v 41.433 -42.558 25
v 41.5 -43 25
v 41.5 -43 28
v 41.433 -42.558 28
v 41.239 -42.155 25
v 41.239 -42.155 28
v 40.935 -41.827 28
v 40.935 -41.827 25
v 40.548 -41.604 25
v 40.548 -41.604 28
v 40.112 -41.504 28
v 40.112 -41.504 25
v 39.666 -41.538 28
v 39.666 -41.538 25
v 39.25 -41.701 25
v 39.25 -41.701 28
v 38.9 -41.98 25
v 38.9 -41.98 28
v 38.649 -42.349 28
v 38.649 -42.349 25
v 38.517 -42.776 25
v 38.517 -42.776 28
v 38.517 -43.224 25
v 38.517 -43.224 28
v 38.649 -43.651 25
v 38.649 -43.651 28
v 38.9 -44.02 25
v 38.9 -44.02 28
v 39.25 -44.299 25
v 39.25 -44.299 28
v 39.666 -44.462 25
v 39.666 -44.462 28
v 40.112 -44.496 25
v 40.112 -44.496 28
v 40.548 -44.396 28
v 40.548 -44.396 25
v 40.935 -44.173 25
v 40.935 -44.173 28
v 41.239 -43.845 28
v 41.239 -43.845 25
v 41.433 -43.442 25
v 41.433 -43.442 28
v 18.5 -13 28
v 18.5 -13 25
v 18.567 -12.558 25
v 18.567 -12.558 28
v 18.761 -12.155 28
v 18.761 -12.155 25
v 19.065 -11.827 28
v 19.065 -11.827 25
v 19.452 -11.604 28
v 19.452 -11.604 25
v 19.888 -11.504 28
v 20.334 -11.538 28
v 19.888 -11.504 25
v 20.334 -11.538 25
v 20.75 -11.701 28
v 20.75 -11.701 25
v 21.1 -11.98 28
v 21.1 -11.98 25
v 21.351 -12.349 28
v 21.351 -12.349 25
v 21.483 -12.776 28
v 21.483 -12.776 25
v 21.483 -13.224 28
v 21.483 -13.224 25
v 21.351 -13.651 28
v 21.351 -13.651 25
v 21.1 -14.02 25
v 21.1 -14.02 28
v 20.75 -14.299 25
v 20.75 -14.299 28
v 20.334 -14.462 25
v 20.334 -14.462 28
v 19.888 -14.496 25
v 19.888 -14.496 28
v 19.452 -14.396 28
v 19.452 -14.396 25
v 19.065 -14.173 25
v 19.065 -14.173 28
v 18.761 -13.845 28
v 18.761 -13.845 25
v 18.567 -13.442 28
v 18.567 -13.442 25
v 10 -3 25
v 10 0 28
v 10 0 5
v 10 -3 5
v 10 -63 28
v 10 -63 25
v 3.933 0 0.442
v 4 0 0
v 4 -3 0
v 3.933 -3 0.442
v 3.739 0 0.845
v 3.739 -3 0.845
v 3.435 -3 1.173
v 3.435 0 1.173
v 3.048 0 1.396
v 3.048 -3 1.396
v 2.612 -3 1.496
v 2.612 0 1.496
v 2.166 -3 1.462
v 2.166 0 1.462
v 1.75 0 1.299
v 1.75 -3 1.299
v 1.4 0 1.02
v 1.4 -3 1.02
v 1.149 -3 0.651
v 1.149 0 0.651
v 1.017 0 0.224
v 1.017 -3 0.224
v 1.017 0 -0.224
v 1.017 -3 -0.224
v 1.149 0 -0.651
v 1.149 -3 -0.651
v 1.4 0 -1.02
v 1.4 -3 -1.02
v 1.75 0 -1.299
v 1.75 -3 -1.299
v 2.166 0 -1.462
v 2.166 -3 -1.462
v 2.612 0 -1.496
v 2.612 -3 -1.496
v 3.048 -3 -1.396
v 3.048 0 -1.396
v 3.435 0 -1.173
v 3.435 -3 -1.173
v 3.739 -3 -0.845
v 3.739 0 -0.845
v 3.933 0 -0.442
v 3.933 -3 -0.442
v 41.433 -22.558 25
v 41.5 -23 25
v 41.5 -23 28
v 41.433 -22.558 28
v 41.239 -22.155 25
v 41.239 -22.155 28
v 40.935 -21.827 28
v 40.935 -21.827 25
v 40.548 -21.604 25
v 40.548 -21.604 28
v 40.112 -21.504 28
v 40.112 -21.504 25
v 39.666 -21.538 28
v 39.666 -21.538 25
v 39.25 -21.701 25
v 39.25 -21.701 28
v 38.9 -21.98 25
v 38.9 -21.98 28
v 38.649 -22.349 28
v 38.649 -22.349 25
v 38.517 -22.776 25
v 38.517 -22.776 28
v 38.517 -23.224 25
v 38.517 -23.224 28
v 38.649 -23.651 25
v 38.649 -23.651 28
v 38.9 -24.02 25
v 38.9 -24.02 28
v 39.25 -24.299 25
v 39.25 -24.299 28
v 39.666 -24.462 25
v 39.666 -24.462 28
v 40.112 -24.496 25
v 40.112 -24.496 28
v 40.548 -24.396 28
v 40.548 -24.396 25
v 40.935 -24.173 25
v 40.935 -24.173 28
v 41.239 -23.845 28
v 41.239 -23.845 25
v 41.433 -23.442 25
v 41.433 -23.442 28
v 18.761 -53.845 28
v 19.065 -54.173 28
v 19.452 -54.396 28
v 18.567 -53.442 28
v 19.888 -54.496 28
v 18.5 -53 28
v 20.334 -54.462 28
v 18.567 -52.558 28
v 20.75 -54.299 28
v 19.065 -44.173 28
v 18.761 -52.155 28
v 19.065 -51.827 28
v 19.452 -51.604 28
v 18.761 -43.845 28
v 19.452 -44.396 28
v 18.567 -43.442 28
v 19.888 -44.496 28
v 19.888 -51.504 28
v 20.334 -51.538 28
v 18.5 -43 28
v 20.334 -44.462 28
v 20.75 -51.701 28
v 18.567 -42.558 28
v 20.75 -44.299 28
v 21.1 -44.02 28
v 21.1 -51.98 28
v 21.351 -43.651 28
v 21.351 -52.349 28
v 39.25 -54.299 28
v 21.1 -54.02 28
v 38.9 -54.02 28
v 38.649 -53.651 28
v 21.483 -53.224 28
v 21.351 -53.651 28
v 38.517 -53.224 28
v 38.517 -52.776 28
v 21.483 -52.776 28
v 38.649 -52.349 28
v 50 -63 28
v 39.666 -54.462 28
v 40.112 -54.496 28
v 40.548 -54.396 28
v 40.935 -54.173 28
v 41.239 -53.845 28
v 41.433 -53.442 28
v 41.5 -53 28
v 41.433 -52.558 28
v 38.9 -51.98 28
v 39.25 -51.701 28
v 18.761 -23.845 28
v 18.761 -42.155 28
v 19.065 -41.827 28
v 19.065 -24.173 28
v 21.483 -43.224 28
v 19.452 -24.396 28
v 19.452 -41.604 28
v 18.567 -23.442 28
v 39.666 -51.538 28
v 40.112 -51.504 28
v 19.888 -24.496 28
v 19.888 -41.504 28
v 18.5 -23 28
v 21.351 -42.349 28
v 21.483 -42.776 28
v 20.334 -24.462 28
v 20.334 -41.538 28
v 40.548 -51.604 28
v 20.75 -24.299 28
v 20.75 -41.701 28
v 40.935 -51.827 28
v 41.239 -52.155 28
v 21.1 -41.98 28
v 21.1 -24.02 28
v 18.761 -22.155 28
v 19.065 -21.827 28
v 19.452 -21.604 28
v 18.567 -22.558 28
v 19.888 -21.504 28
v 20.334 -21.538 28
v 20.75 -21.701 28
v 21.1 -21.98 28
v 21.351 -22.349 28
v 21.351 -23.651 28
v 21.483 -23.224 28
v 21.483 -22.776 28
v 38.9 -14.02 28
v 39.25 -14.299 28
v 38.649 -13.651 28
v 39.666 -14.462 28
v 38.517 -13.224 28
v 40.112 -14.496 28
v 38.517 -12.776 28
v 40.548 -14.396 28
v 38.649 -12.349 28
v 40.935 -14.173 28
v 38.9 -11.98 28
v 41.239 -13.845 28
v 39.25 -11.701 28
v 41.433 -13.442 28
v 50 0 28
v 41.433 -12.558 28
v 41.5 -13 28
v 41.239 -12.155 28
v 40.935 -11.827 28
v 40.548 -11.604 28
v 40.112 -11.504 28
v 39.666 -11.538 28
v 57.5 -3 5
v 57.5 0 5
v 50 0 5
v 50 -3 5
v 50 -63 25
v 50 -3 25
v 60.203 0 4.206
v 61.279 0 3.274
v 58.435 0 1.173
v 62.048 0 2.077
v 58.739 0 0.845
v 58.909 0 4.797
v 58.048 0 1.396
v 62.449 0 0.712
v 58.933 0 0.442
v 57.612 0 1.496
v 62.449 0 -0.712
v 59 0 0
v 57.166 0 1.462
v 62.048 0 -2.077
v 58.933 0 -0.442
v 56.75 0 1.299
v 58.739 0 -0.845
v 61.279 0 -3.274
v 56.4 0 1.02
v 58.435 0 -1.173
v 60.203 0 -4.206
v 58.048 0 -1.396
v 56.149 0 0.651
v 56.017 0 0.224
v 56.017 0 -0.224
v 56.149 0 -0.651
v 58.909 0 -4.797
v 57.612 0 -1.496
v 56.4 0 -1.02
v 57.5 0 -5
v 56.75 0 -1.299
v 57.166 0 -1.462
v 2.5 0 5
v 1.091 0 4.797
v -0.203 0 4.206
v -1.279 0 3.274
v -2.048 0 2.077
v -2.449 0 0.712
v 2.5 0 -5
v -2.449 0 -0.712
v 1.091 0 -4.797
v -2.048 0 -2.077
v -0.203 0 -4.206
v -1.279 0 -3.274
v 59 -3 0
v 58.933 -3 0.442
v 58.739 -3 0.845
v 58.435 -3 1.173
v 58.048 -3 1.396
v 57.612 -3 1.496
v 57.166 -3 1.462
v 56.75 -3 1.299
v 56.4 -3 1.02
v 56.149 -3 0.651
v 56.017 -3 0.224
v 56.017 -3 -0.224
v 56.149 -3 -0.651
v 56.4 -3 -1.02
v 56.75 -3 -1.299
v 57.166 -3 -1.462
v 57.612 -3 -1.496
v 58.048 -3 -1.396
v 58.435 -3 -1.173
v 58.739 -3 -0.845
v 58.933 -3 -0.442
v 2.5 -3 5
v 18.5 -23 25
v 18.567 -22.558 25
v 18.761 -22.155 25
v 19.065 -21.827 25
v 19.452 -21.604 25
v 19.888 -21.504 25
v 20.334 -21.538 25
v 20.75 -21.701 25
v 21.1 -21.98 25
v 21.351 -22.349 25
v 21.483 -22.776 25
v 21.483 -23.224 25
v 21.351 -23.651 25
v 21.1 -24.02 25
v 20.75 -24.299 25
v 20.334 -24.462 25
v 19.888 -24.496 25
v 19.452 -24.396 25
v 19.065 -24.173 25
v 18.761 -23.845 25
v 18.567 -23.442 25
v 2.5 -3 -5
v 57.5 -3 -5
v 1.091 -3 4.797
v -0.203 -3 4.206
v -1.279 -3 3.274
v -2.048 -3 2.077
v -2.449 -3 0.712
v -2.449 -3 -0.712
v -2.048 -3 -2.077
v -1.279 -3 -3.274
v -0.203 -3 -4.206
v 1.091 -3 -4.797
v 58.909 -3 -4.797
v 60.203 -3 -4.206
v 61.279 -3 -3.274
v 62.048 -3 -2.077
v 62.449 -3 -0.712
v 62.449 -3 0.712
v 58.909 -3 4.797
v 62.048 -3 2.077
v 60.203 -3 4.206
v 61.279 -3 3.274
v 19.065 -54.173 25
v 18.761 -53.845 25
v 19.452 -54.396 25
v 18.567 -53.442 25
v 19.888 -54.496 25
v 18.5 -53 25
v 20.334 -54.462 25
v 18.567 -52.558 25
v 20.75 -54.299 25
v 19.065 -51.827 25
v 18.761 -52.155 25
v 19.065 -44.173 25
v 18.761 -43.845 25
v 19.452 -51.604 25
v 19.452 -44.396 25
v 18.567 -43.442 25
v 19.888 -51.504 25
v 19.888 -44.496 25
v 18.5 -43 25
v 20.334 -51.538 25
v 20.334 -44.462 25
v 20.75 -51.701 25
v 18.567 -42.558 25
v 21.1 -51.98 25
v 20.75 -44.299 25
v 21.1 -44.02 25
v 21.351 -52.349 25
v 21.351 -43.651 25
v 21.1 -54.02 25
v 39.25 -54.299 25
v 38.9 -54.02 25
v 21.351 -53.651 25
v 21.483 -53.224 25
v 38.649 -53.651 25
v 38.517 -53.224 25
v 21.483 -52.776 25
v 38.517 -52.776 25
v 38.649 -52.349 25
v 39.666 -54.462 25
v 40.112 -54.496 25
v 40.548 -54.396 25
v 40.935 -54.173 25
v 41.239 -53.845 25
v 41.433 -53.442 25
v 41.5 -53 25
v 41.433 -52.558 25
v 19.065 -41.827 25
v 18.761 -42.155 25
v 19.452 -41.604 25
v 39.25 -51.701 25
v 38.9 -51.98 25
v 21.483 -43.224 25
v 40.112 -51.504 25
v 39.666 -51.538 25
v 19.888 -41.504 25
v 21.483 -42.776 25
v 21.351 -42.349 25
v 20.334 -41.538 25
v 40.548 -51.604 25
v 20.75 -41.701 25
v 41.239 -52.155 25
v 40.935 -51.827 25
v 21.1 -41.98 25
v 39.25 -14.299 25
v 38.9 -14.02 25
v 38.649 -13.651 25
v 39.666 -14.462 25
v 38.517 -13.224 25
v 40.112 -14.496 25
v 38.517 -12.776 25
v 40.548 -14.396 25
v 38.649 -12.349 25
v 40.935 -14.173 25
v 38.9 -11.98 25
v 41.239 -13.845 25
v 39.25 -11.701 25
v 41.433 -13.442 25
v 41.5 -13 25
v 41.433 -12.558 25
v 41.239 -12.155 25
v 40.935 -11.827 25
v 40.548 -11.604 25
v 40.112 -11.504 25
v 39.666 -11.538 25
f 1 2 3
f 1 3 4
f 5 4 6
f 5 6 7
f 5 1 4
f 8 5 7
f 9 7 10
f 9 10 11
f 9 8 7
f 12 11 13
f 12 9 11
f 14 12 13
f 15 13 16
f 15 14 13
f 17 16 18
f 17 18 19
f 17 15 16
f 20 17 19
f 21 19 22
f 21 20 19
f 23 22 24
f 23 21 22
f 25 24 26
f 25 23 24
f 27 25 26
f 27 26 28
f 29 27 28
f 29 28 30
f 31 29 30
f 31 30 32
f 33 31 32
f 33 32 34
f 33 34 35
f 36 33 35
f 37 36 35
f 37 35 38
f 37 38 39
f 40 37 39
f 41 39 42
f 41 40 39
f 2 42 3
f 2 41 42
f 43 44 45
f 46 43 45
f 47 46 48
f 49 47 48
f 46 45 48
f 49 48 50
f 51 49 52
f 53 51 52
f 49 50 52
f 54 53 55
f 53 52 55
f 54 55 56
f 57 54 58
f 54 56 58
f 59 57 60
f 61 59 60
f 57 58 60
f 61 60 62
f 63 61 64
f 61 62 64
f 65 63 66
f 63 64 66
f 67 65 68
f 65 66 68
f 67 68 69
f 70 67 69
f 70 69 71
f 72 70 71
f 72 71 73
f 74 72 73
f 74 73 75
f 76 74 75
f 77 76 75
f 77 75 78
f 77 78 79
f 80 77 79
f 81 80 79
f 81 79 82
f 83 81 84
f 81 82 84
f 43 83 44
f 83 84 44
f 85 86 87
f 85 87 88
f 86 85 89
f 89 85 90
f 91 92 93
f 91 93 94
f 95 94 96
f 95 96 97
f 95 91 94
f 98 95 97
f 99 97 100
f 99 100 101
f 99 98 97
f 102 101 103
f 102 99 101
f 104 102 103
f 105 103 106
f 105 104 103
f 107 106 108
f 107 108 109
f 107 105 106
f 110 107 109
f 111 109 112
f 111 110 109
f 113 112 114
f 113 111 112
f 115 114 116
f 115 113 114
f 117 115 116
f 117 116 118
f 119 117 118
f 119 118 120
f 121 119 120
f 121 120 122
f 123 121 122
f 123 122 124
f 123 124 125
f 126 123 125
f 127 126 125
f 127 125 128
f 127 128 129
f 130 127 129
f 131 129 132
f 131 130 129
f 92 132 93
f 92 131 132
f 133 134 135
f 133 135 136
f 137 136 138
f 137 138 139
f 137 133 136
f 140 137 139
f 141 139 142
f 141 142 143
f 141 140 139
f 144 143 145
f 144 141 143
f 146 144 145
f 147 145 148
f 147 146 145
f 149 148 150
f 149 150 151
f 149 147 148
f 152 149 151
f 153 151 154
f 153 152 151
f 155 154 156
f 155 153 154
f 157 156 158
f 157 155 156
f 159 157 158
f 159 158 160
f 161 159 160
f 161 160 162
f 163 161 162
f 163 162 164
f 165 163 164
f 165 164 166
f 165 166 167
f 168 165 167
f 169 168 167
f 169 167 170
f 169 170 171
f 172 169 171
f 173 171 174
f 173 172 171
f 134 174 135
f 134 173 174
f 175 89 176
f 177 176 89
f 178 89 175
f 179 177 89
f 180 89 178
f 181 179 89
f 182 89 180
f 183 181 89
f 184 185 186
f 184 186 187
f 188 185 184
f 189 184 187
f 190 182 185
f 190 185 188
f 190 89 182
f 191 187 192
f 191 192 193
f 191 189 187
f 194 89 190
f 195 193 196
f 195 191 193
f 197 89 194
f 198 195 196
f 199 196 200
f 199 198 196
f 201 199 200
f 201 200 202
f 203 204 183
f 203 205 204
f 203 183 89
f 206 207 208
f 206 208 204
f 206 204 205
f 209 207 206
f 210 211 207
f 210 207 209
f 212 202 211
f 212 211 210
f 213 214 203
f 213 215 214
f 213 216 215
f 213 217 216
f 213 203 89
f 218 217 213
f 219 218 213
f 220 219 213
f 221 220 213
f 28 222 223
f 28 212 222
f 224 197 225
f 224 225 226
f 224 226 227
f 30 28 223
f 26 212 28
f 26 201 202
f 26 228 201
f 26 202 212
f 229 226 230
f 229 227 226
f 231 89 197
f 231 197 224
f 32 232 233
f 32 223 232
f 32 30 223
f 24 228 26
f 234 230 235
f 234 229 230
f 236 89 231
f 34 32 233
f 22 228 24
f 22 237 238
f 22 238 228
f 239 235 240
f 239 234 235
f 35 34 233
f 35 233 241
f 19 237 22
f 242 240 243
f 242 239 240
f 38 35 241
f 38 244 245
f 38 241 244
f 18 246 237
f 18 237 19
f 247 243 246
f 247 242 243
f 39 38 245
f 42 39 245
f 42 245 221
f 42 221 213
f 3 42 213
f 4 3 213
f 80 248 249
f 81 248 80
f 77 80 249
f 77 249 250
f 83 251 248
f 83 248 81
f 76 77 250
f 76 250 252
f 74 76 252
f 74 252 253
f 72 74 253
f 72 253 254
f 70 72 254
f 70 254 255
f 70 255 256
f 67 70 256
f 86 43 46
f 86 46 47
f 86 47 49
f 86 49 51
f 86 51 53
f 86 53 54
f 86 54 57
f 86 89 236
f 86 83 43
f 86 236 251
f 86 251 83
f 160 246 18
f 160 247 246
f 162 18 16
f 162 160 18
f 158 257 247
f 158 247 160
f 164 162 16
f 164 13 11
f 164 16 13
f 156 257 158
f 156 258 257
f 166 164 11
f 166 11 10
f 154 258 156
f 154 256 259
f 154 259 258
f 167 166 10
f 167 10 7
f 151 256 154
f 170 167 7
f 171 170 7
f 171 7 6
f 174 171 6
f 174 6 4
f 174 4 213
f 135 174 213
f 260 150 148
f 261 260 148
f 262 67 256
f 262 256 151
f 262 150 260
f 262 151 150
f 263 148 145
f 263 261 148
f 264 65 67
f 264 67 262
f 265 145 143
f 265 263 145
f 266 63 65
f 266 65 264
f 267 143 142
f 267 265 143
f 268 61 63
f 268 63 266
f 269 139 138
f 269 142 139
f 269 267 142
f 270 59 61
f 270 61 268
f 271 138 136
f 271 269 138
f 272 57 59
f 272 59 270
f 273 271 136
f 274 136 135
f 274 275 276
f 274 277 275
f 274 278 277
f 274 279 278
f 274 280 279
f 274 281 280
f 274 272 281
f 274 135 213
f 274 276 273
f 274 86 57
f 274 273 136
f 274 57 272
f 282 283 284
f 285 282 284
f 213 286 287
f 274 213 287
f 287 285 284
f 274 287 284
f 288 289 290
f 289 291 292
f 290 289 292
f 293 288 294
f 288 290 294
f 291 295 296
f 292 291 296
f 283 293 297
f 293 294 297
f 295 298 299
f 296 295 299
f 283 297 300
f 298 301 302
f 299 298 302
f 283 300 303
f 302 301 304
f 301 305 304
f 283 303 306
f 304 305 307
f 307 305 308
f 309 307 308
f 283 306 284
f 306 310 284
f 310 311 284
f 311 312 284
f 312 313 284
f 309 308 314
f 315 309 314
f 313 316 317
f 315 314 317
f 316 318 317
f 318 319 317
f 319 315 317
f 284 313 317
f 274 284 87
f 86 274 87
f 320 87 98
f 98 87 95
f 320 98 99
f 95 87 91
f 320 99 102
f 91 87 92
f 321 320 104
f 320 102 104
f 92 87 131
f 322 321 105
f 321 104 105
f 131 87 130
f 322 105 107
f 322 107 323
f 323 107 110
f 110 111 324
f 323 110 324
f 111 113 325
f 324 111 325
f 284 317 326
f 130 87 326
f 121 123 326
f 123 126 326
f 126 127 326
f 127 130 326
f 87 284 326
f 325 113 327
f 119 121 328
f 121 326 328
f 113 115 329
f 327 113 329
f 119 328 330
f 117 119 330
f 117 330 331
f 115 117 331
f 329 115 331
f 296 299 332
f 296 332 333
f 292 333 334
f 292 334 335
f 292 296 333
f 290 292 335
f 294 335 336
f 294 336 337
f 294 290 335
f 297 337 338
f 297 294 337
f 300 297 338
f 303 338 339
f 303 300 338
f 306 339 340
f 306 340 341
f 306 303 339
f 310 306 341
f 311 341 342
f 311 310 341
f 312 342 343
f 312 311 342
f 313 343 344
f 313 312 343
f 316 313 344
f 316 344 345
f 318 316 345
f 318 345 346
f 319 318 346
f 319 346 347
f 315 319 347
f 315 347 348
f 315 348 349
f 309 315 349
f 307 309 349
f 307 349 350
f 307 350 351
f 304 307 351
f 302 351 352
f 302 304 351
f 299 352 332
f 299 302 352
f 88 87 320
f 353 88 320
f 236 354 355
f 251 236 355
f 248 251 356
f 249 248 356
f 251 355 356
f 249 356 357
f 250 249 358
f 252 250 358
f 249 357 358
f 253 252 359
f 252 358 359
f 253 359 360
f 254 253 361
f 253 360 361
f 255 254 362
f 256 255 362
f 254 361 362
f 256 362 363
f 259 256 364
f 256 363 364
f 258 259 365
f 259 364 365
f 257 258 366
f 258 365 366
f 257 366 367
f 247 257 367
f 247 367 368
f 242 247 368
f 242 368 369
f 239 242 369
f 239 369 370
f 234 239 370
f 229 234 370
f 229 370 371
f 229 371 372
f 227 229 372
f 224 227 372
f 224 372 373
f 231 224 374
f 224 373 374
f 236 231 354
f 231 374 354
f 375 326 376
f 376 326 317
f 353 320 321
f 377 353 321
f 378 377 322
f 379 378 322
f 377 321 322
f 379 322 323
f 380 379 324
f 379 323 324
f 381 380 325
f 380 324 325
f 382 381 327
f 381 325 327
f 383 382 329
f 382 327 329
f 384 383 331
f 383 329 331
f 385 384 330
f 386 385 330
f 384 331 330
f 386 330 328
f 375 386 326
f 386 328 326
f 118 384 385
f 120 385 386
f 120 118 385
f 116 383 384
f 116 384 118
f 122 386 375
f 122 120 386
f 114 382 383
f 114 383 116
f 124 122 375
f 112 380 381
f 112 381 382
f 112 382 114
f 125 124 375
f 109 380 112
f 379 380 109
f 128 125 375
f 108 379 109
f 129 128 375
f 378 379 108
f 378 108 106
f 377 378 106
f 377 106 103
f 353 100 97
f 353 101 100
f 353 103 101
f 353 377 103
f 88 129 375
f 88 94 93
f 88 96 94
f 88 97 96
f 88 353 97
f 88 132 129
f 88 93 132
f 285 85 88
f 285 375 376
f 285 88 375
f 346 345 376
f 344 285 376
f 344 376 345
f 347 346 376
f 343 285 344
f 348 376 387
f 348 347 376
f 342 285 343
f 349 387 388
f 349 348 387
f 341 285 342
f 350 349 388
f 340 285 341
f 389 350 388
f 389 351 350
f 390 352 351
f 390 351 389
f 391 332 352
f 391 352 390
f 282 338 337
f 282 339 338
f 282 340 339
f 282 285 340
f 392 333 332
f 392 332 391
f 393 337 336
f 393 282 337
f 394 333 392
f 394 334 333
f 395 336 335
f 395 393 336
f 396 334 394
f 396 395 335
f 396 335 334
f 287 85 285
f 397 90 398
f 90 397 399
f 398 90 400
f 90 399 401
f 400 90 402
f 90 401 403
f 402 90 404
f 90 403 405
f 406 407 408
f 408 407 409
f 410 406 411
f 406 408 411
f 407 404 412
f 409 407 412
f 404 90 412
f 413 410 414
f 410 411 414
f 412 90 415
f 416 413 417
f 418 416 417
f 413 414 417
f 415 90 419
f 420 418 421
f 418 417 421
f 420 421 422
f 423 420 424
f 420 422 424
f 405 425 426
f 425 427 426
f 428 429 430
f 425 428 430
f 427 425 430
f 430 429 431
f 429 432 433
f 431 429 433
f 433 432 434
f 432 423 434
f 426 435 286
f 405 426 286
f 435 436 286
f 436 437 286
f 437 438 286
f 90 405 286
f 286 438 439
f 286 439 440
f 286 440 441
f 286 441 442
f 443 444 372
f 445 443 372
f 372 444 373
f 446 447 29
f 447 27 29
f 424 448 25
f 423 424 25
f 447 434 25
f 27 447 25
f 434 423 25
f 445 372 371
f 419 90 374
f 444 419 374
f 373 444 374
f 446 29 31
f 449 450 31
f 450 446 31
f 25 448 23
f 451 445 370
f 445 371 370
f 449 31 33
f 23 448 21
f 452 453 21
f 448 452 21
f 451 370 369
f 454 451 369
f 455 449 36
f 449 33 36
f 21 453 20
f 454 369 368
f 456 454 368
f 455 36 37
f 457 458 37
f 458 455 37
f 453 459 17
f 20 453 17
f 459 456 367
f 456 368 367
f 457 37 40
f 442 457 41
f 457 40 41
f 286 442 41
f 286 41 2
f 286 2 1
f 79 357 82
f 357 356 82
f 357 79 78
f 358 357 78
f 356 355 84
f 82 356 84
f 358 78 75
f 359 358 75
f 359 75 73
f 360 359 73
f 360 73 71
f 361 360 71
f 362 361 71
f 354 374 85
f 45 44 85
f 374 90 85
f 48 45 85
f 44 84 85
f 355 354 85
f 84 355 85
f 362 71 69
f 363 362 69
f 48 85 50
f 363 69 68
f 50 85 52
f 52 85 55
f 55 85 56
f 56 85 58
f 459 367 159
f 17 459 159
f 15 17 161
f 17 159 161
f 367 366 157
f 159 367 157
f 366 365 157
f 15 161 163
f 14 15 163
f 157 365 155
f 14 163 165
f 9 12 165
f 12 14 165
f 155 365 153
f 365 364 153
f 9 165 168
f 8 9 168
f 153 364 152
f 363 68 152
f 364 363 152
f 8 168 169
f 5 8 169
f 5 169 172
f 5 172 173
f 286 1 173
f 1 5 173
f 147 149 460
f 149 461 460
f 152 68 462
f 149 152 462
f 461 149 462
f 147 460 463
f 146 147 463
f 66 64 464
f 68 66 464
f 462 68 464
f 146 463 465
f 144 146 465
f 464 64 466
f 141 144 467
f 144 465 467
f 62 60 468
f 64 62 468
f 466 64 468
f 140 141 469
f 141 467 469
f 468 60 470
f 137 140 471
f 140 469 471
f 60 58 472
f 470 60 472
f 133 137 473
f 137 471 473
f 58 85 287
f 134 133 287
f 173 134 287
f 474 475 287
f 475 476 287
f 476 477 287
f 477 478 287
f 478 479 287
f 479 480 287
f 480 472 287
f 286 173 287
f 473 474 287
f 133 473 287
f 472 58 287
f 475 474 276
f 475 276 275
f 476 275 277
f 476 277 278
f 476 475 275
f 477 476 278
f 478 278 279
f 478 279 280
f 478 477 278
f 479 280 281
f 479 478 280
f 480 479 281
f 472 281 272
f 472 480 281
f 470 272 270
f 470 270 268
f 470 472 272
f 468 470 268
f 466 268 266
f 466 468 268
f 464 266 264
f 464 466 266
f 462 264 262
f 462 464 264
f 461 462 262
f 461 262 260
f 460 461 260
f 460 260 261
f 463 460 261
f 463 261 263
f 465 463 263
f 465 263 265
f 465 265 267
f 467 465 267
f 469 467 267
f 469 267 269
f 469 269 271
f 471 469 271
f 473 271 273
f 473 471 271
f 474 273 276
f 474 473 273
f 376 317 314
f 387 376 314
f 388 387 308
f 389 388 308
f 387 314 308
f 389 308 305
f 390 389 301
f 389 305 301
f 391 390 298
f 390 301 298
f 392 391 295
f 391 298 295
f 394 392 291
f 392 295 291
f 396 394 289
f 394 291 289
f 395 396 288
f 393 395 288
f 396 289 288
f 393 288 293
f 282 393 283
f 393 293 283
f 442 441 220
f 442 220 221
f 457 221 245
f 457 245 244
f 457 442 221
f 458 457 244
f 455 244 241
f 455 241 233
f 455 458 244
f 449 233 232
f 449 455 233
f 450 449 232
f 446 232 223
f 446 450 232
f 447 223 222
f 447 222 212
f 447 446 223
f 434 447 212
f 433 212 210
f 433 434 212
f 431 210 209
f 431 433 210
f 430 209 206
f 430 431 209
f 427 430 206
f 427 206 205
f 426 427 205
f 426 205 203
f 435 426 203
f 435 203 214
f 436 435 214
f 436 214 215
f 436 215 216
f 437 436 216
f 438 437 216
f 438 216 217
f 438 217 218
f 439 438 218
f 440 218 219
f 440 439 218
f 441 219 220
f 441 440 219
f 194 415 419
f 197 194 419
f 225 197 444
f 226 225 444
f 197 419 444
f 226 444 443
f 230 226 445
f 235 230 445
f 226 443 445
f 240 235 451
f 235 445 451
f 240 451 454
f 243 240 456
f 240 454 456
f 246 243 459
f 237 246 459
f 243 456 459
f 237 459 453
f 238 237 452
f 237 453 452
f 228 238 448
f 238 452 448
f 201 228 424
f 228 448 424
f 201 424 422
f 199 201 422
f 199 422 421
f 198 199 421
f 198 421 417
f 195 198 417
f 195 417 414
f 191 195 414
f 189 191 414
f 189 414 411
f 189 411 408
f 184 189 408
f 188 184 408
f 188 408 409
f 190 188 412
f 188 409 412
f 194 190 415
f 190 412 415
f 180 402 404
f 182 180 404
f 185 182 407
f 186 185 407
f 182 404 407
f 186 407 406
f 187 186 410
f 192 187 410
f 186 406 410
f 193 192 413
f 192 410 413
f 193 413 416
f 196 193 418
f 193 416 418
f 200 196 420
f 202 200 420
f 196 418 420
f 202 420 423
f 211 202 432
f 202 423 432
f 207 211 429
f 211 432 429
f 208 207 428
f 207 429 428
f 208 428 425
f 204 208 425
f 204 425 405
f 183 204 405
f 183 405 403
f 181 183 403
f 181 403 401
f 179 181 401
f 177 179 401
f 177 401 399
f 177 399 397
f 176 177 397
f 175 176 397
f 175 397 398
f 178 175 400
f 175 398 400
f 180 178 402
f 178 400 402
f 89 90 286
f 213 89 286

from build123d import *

# Parameters (mm, degrees)
F0_R     = 1.5
F1_DEPTH = 3
F2_R     = 1.5
F3_DEPTH = 3


# Not quite as in the source:
# - a feature names something its author has since deleted; it is built from what else it names


with BuildPart() as f1:
    # F0 (on Front) → F1 (new body)
    with BuildSketch(Plane.XZ):
        with BuildLine():
            Line((57.5, 5), (50, 5))
            Line((50, 5), (50, 25))
            Line((50, 25), (10, 25))
            Line((10, 25), (10, 5))
            Line((10, 5), (2.5, 5))
            ThreePointArc((2.5, 5), (-2.5, 0), (2.5, -5))
            Line((2.5, -5), (57.5, -5))
            ThreePointArc((57.5, -5), (62.5, 0), (57.5, 5))
        make_face()
        with Locations((2.5, 0)):
            Circle(F0_R, mode=Mode.SUBTRACT)
        with Locations((57.5, 0)):
            Circle(F0_R, mode=Mode.SUBTRACT)
    extrude(amount=F1_DEPTH)

    # F2 (on face) → F3 (join)
    with BuildSketch(Plane.XY.offset(25)):
        Polygon((50, 0), (10, 0), (10, -3), (10, -13), (10, -23), (10, -33), (10, -43), (10, -53), (10, -63), (50, -63), (50, -53), (50, -43), (50, -33), (50, -23), (50, -13), (50, -3), align=None)
        with BuildLine():
            ThreePointArc((21.5, -53), (20, -54.5), (18.5, -53))
            ThreePointArc((18.5, -53), (20, -51.5), (21.5, -53))
        make_face(mode=Mode.SUBTRACT)
        with BuildLine():
            ThreePointArc((21.5, -43), (20, -44.5), (18.5, -43))
            ThreePointArc((18.5, -43), (20, -41.5), (21.5, -43))
        make_face(mode=Mode.SUBTRACT)
        with Locations((40, -53)):
            Circle(F2_R, mode=Mode.SUBTRACT)
        with Locations((40, -43)):
            Circle(F2_R, mode=Mode.SUBTRACT)
        with BuildLine():
            ThreePointArc((21.5, -23), (20, -24.5), (18.5, -23))
            ThreePointArc((18.5, -23), (20, -21.5), (21.5, -23))
        make_face(mode=Mode.SUBTRACT)
        with BuildLine():
            ThreePointArc((21.5, -13), (20, -14.5), (18.5, -13))
            ThreePointArc((18.5, -13), (20, -11.5), (21.5, -13))
        make_face(mode=Mode.SUBTRACT)
        with Locations((40, -23)):
            Circle(F2_R, mode=Mode.SUBTRACT)
        with Locations((40, -13)):
            Circle(F2_R, mode=Mode.SUBTRACT)
    extrude(amount=F3_DEPTH)


solid = f1.part
